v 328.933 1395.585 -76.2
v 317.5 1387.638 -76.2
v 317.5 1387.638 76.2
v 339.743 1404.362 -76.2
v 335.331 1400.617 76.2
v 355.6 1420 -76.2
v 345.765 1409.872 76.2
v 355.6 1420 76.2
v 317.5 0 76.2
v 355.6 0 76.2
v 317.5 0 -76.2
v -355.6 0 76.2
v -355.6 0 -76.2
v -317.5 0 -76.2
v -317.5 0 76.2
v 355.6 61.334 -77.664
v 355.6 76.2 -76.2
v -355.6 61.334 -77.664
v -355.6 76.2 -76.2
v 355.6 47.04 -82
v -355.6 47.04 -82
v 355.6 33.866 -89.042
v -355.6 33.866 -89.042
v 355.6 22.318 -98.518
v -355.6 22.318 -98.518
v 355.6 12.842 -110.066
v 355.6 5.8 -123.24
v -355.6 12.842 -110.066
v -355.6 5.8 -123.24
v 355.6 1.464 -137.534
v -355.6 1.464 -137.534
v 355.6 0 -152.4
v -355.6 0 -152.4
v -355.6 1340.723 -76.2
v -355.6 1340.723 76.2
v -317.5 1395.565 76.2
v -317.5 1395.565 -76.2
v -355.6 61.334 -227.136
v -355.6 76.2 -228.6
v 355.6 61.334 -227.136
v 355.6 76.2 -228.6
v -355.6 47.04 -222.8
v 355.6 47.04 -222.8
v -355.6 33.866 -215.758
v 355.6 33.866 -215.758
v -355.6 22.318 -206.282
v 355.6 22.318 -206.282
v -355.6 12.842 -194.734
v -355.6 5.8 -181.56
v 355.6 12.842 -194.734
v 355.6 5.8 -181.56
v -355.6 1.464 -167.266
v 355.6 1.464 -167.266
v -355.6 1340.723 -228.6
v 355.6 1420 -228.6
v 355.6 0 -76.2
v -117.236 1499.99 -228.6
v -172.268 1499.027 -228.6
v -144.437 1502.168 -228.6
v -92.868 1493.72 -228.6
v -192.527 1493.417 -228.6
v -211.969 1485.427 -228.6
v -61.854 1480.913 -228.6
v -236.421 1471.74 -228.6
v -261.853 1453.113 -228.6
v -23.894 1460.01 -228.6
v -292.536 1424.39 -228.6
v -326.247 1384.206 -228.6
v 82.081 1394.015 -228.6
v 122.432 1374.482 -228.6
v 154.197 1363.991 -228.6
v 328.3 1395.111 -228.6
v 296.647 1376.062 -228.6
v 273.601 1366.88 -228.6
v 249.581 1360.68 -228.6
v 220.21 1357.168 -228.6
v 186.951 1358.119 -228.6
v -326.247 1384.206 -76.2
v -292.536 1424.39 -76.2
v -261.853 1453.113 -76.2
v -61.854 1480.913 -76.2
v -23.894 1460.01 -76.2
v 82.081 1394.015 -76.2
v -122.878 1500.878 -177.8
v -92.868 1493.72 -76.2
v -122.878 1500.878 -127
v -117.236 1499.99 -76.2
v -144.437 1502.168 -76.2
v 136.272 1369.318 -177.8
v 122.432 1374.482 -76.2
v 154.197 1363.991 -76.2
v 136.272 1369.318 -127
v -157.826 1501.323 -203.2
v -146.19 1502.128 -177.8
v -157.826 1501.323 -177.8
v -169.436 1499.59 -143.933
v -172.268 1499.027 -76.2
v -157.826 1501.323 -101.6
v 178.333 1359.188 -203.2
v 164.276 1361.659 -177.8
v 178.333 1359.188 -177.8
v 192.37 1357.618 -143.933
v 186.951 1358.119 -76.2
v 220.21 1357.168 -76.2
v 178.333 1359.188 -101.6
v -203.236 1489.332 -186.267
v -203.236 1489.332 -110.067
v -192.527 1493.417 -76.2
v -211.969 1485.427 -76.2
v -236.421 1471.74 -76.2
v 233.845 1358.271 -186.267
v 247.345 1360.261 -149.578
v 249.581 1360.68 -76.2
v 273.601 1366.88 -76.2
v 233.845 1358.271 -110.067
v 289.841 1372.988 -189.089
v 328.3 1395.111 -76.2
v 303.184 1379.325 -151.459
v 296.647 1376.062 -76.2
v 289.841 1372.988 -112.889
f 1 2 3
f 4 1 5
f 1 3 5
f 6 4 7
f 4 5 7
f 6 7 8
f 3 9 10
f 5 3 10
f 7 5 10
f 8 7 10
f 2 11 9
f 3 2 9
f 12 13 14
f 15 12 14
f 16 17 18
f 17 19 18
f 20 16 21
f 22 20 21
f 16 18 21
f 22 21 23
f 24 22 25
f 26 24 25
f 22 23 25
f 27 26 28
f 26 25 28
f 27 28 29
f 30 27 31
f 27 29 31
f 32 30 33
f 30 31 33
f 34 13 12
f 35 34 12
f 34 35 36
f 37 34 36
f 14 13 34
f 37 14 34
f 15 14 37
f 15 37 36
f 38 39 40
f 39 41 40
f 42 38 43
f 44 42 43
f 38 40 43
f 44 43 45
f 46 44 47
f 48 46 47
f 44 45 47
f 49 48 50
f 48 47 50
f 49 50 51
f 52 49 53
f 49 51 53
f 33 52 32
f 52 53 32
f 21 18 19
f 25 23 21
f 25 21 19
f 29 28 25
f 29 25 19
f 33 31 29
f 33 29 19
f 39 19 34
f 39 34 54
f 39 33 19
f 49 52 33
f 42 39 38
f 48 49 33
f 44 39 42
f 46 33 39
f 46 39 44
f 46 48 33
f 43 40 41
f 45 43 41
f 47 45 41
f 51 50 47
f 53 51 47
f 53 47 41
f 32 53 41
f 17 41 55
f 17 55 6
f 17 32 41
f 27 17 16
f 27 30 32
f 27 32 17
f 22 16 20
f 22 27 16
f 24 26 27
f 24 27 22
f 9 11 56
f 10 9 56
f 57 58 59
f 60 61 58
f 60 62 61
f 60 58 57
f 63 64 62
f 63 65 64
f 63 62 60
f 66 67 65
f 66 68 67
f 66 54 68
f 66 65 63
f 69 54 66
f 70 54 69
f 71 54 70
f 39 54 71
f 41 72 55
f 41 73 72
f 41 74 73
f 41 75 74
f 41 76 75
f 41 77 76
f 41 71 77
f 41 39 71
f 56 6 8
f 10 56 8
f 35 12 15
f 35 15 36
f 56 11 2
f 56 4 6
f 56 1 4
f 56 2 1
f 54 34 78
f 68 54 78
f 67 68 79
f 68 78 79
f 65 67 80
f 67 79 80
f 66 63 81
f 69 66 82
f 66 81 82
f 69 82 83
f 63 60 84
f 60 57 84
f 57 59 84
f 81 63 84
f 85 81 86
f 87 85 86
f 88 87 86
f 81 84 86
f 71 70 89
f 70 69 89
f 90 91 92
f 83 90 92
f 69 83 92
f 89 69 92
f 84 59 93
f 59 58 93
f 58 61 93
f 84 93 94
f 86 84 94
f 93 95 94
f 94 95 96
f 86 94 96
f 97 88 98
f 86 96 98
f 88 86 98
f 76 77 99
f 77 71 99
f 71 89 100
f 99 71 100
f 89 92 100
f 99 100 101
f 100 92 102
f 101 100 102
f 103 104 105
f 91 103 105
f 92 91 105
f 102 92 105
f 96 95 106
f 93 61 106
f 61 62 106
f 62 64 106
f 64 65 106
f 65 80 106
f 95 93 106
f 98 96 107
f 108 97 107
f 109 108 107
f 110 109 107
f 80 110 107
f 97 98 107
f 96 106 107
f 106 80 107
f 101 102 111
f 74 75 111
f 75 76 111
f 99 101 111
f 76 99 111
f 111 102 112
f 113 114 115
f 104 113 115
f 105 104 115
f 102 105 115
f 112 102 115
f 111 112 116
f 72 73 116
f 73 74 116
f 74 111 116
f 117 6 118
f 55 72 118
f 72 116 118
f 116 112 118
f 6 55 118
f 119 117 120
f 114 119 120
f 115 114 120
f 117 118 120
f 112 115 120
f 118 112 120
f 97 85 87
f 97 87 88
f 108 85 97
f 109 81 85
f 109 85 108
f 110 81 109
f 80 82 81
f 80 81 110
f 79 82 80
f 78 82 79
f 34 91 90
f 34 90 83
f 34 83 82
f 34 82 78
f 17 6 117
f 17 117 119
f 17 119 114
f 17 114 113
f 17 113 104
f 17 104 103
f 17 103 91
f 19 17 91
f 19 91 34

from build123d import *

# Parameters (mm, degrees)
F1_DEPTH = 3657.6
F0_W     = 38.1
F0_H     = 152.4
F2_DEPTH = 3657.6
F3_R     = 76.19999
F5_DEPTH = 457.2


# Not quite as in the source:
# - a fillet or chamfer is up to 0.001 mm smaller than in the source, because OpenCascade refuses the exact size


with BuildPart() as f1:
    # F0 (on Front) → F1 (new body)
    with BuildSketch(Plane.XZ):
        Polygon((355.6, -228.6), (355.6, -76.2), (317.5, -76.2), (-317.5, -76.2), (-355.6, -76.2), (-355.6, -228.6), align=None)
    extrude(amount=-F1_DEPTH)

    # F3 (radius 76.2 in the source; OpenCascade refuses exactly that, so slightly less here)
    f3_edges = [f1.edges().sort_by_distance(p)[0] for p in [
        (0, 0, -76.2),
        (0, 0, -228.6),
        (0, 3657.6, -76.2),
        (0, 3657.6, -228.6),
    ]]
    fillet(f3_edges, radius=F3_R)


with BuildPart() as f2:
    # F0 (on Front) → F2 (new body)
    with BuildSketch(Plane.XZ):
        with Locations((-336.55, 0)):
            Rectangle(F0_W, F0_H)
    extrude(amount=-F2_DEPTH)


with BuildPart() as f2b:
    # F0 (on Front) → F2, piece 2 (new body)
    with BuildSketch(Plane.XZ):
        with Locations((336.55, 0)):
            Rectangle(F0_W, F0_H)
    extrude(amount=-F2_DEPTH)


with BuildPart() as f5_tool:
    # F4 (on face) → F5 (new body)
    with BuildSketch(Plane.XY.offset(76.2)):
        with BuildLine():
            add(Edge.make_bspline(
                [(-355.6, 1340.7233953476), (-915.2366441797, 2359.9510577055), (-1874.2710818809, 3810.9319191607), (44.2691580348, 3688.5723981757), (1019.2784863169, 3988.9601565781), (622.7710571708, 2551.7090574544), (355.6, 1420.0000762939)],
                knots=[0, 0, 0, 0, 0.3063254336, 0.5332153522, 0.6939292156, 1, 1, 1, 1], degree=3))
            Line((-355.6, 1340.7233953476), (-355.6, 3657.6))
            Line((-355.6, 3657.6), (-317.5, 3657.6))
            Line((-317.5, 3657.6), (-317.5, 1395.5652334485))
            add(Edge.make_bspline(
                [(-317.5, 1395.5652334485), (-258.9308915713, 1469.3529332863), (-105.9839814864, 1560.950588612), (119.3033990895, 1321.8331668454), (301.4968463301, 1359.961763396), (355.6, 1420.0000762939)],
                knots=[0.0633807199, 0.0633807199, 0.0633807199, 0.0633807199, 0.3440050043, 0.6929232049, 1, 1, 1, 1], degree=3))
        make_face()
        with BuildLine():
            Line((-355.6, 3657.6), (-355.6, 1340.7233953476))
            add(Edge.make_bspline(
                [(-355.6, 1340.7233953476), (-343.4662540536, 1360.5532417767), (-330.7281932248, 1378.8998277892), (-317.5, 1395.5652334485)],
                knots=[0, 0, 0, 0, 0.0633807199, 0.0633807199, 0.0633807199, 0.0633807199], degree=3))
            Line((-317.5, 1395.5652334485), (-317.5, 3657.6))
            Line((-317.5, 3657.6), (-355.6, 3657.6))
        make_face()
    extrude(amount=-F5_DEPTH)


with BuildPart() as f1_1:
    add(f1.part)

    # F5: cut by f5_tool
    add(f5_tool.part, mode=Mode.SUBTRACT)


with BuildPart() as f2_1:
    add(f2.part)

    # F5: cut by f5_tool
    add(f5_tool.part, mode=Mode.SUBTRACT)


with BuildPart() as f2b_1:
    add(f2b.part)

    # F5: cut by f5_tool
    add(f5_tool.part, mode=Mode.SUBTRACT)


solid = Compound([f1_1.part, f2_1.part, f2b_1.part])
